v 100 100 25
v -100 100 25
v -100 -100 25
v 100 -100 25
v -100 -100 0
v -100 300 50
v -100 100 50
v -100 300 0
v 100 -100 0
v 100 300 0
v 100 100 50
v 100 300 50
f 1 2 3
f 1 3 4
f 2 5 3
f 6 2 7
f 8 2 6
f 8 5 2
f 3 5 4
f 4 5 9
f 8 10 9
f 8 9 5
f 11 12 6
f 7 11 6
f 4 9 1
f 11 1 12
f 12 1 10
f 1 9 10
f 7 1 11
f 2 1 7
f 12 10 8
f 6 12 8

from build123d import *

# Parameters (mm, degrees)
SKETCH1_W           = 200
SKETCH1_H           = 200
BOSS_EXTRUDE1_DEPTH = 25
SKETCH2_W           = 200
SKETCH2_H           = 200
BOSS_EXTRUDE2_DEPTH = 50


with BuildPart() as part:
    # Sketch1 → Boss-Extrude1 (new body)
    with BuildSketch(Plane.XY):
        Rectangle(SKETCH1_W, SKETCH1_H)
    extrude(amount=BOSS_EXTRUDE1_DEPTH)

    # Sketch2 → Boss-Extrude2 (add)
    with BuildSketch(Plane(origin=(0, 0, 0), x_dir=(-1, 0, 0), z_dir=(0, 0, -1))):
        with Locations((0, 200)):
            Rectangle(SKETCH2_W, SKETCH2_H)
    extrude(amount=-BOSS_EXTRUDE2_DEPTH)


solid = part.part
